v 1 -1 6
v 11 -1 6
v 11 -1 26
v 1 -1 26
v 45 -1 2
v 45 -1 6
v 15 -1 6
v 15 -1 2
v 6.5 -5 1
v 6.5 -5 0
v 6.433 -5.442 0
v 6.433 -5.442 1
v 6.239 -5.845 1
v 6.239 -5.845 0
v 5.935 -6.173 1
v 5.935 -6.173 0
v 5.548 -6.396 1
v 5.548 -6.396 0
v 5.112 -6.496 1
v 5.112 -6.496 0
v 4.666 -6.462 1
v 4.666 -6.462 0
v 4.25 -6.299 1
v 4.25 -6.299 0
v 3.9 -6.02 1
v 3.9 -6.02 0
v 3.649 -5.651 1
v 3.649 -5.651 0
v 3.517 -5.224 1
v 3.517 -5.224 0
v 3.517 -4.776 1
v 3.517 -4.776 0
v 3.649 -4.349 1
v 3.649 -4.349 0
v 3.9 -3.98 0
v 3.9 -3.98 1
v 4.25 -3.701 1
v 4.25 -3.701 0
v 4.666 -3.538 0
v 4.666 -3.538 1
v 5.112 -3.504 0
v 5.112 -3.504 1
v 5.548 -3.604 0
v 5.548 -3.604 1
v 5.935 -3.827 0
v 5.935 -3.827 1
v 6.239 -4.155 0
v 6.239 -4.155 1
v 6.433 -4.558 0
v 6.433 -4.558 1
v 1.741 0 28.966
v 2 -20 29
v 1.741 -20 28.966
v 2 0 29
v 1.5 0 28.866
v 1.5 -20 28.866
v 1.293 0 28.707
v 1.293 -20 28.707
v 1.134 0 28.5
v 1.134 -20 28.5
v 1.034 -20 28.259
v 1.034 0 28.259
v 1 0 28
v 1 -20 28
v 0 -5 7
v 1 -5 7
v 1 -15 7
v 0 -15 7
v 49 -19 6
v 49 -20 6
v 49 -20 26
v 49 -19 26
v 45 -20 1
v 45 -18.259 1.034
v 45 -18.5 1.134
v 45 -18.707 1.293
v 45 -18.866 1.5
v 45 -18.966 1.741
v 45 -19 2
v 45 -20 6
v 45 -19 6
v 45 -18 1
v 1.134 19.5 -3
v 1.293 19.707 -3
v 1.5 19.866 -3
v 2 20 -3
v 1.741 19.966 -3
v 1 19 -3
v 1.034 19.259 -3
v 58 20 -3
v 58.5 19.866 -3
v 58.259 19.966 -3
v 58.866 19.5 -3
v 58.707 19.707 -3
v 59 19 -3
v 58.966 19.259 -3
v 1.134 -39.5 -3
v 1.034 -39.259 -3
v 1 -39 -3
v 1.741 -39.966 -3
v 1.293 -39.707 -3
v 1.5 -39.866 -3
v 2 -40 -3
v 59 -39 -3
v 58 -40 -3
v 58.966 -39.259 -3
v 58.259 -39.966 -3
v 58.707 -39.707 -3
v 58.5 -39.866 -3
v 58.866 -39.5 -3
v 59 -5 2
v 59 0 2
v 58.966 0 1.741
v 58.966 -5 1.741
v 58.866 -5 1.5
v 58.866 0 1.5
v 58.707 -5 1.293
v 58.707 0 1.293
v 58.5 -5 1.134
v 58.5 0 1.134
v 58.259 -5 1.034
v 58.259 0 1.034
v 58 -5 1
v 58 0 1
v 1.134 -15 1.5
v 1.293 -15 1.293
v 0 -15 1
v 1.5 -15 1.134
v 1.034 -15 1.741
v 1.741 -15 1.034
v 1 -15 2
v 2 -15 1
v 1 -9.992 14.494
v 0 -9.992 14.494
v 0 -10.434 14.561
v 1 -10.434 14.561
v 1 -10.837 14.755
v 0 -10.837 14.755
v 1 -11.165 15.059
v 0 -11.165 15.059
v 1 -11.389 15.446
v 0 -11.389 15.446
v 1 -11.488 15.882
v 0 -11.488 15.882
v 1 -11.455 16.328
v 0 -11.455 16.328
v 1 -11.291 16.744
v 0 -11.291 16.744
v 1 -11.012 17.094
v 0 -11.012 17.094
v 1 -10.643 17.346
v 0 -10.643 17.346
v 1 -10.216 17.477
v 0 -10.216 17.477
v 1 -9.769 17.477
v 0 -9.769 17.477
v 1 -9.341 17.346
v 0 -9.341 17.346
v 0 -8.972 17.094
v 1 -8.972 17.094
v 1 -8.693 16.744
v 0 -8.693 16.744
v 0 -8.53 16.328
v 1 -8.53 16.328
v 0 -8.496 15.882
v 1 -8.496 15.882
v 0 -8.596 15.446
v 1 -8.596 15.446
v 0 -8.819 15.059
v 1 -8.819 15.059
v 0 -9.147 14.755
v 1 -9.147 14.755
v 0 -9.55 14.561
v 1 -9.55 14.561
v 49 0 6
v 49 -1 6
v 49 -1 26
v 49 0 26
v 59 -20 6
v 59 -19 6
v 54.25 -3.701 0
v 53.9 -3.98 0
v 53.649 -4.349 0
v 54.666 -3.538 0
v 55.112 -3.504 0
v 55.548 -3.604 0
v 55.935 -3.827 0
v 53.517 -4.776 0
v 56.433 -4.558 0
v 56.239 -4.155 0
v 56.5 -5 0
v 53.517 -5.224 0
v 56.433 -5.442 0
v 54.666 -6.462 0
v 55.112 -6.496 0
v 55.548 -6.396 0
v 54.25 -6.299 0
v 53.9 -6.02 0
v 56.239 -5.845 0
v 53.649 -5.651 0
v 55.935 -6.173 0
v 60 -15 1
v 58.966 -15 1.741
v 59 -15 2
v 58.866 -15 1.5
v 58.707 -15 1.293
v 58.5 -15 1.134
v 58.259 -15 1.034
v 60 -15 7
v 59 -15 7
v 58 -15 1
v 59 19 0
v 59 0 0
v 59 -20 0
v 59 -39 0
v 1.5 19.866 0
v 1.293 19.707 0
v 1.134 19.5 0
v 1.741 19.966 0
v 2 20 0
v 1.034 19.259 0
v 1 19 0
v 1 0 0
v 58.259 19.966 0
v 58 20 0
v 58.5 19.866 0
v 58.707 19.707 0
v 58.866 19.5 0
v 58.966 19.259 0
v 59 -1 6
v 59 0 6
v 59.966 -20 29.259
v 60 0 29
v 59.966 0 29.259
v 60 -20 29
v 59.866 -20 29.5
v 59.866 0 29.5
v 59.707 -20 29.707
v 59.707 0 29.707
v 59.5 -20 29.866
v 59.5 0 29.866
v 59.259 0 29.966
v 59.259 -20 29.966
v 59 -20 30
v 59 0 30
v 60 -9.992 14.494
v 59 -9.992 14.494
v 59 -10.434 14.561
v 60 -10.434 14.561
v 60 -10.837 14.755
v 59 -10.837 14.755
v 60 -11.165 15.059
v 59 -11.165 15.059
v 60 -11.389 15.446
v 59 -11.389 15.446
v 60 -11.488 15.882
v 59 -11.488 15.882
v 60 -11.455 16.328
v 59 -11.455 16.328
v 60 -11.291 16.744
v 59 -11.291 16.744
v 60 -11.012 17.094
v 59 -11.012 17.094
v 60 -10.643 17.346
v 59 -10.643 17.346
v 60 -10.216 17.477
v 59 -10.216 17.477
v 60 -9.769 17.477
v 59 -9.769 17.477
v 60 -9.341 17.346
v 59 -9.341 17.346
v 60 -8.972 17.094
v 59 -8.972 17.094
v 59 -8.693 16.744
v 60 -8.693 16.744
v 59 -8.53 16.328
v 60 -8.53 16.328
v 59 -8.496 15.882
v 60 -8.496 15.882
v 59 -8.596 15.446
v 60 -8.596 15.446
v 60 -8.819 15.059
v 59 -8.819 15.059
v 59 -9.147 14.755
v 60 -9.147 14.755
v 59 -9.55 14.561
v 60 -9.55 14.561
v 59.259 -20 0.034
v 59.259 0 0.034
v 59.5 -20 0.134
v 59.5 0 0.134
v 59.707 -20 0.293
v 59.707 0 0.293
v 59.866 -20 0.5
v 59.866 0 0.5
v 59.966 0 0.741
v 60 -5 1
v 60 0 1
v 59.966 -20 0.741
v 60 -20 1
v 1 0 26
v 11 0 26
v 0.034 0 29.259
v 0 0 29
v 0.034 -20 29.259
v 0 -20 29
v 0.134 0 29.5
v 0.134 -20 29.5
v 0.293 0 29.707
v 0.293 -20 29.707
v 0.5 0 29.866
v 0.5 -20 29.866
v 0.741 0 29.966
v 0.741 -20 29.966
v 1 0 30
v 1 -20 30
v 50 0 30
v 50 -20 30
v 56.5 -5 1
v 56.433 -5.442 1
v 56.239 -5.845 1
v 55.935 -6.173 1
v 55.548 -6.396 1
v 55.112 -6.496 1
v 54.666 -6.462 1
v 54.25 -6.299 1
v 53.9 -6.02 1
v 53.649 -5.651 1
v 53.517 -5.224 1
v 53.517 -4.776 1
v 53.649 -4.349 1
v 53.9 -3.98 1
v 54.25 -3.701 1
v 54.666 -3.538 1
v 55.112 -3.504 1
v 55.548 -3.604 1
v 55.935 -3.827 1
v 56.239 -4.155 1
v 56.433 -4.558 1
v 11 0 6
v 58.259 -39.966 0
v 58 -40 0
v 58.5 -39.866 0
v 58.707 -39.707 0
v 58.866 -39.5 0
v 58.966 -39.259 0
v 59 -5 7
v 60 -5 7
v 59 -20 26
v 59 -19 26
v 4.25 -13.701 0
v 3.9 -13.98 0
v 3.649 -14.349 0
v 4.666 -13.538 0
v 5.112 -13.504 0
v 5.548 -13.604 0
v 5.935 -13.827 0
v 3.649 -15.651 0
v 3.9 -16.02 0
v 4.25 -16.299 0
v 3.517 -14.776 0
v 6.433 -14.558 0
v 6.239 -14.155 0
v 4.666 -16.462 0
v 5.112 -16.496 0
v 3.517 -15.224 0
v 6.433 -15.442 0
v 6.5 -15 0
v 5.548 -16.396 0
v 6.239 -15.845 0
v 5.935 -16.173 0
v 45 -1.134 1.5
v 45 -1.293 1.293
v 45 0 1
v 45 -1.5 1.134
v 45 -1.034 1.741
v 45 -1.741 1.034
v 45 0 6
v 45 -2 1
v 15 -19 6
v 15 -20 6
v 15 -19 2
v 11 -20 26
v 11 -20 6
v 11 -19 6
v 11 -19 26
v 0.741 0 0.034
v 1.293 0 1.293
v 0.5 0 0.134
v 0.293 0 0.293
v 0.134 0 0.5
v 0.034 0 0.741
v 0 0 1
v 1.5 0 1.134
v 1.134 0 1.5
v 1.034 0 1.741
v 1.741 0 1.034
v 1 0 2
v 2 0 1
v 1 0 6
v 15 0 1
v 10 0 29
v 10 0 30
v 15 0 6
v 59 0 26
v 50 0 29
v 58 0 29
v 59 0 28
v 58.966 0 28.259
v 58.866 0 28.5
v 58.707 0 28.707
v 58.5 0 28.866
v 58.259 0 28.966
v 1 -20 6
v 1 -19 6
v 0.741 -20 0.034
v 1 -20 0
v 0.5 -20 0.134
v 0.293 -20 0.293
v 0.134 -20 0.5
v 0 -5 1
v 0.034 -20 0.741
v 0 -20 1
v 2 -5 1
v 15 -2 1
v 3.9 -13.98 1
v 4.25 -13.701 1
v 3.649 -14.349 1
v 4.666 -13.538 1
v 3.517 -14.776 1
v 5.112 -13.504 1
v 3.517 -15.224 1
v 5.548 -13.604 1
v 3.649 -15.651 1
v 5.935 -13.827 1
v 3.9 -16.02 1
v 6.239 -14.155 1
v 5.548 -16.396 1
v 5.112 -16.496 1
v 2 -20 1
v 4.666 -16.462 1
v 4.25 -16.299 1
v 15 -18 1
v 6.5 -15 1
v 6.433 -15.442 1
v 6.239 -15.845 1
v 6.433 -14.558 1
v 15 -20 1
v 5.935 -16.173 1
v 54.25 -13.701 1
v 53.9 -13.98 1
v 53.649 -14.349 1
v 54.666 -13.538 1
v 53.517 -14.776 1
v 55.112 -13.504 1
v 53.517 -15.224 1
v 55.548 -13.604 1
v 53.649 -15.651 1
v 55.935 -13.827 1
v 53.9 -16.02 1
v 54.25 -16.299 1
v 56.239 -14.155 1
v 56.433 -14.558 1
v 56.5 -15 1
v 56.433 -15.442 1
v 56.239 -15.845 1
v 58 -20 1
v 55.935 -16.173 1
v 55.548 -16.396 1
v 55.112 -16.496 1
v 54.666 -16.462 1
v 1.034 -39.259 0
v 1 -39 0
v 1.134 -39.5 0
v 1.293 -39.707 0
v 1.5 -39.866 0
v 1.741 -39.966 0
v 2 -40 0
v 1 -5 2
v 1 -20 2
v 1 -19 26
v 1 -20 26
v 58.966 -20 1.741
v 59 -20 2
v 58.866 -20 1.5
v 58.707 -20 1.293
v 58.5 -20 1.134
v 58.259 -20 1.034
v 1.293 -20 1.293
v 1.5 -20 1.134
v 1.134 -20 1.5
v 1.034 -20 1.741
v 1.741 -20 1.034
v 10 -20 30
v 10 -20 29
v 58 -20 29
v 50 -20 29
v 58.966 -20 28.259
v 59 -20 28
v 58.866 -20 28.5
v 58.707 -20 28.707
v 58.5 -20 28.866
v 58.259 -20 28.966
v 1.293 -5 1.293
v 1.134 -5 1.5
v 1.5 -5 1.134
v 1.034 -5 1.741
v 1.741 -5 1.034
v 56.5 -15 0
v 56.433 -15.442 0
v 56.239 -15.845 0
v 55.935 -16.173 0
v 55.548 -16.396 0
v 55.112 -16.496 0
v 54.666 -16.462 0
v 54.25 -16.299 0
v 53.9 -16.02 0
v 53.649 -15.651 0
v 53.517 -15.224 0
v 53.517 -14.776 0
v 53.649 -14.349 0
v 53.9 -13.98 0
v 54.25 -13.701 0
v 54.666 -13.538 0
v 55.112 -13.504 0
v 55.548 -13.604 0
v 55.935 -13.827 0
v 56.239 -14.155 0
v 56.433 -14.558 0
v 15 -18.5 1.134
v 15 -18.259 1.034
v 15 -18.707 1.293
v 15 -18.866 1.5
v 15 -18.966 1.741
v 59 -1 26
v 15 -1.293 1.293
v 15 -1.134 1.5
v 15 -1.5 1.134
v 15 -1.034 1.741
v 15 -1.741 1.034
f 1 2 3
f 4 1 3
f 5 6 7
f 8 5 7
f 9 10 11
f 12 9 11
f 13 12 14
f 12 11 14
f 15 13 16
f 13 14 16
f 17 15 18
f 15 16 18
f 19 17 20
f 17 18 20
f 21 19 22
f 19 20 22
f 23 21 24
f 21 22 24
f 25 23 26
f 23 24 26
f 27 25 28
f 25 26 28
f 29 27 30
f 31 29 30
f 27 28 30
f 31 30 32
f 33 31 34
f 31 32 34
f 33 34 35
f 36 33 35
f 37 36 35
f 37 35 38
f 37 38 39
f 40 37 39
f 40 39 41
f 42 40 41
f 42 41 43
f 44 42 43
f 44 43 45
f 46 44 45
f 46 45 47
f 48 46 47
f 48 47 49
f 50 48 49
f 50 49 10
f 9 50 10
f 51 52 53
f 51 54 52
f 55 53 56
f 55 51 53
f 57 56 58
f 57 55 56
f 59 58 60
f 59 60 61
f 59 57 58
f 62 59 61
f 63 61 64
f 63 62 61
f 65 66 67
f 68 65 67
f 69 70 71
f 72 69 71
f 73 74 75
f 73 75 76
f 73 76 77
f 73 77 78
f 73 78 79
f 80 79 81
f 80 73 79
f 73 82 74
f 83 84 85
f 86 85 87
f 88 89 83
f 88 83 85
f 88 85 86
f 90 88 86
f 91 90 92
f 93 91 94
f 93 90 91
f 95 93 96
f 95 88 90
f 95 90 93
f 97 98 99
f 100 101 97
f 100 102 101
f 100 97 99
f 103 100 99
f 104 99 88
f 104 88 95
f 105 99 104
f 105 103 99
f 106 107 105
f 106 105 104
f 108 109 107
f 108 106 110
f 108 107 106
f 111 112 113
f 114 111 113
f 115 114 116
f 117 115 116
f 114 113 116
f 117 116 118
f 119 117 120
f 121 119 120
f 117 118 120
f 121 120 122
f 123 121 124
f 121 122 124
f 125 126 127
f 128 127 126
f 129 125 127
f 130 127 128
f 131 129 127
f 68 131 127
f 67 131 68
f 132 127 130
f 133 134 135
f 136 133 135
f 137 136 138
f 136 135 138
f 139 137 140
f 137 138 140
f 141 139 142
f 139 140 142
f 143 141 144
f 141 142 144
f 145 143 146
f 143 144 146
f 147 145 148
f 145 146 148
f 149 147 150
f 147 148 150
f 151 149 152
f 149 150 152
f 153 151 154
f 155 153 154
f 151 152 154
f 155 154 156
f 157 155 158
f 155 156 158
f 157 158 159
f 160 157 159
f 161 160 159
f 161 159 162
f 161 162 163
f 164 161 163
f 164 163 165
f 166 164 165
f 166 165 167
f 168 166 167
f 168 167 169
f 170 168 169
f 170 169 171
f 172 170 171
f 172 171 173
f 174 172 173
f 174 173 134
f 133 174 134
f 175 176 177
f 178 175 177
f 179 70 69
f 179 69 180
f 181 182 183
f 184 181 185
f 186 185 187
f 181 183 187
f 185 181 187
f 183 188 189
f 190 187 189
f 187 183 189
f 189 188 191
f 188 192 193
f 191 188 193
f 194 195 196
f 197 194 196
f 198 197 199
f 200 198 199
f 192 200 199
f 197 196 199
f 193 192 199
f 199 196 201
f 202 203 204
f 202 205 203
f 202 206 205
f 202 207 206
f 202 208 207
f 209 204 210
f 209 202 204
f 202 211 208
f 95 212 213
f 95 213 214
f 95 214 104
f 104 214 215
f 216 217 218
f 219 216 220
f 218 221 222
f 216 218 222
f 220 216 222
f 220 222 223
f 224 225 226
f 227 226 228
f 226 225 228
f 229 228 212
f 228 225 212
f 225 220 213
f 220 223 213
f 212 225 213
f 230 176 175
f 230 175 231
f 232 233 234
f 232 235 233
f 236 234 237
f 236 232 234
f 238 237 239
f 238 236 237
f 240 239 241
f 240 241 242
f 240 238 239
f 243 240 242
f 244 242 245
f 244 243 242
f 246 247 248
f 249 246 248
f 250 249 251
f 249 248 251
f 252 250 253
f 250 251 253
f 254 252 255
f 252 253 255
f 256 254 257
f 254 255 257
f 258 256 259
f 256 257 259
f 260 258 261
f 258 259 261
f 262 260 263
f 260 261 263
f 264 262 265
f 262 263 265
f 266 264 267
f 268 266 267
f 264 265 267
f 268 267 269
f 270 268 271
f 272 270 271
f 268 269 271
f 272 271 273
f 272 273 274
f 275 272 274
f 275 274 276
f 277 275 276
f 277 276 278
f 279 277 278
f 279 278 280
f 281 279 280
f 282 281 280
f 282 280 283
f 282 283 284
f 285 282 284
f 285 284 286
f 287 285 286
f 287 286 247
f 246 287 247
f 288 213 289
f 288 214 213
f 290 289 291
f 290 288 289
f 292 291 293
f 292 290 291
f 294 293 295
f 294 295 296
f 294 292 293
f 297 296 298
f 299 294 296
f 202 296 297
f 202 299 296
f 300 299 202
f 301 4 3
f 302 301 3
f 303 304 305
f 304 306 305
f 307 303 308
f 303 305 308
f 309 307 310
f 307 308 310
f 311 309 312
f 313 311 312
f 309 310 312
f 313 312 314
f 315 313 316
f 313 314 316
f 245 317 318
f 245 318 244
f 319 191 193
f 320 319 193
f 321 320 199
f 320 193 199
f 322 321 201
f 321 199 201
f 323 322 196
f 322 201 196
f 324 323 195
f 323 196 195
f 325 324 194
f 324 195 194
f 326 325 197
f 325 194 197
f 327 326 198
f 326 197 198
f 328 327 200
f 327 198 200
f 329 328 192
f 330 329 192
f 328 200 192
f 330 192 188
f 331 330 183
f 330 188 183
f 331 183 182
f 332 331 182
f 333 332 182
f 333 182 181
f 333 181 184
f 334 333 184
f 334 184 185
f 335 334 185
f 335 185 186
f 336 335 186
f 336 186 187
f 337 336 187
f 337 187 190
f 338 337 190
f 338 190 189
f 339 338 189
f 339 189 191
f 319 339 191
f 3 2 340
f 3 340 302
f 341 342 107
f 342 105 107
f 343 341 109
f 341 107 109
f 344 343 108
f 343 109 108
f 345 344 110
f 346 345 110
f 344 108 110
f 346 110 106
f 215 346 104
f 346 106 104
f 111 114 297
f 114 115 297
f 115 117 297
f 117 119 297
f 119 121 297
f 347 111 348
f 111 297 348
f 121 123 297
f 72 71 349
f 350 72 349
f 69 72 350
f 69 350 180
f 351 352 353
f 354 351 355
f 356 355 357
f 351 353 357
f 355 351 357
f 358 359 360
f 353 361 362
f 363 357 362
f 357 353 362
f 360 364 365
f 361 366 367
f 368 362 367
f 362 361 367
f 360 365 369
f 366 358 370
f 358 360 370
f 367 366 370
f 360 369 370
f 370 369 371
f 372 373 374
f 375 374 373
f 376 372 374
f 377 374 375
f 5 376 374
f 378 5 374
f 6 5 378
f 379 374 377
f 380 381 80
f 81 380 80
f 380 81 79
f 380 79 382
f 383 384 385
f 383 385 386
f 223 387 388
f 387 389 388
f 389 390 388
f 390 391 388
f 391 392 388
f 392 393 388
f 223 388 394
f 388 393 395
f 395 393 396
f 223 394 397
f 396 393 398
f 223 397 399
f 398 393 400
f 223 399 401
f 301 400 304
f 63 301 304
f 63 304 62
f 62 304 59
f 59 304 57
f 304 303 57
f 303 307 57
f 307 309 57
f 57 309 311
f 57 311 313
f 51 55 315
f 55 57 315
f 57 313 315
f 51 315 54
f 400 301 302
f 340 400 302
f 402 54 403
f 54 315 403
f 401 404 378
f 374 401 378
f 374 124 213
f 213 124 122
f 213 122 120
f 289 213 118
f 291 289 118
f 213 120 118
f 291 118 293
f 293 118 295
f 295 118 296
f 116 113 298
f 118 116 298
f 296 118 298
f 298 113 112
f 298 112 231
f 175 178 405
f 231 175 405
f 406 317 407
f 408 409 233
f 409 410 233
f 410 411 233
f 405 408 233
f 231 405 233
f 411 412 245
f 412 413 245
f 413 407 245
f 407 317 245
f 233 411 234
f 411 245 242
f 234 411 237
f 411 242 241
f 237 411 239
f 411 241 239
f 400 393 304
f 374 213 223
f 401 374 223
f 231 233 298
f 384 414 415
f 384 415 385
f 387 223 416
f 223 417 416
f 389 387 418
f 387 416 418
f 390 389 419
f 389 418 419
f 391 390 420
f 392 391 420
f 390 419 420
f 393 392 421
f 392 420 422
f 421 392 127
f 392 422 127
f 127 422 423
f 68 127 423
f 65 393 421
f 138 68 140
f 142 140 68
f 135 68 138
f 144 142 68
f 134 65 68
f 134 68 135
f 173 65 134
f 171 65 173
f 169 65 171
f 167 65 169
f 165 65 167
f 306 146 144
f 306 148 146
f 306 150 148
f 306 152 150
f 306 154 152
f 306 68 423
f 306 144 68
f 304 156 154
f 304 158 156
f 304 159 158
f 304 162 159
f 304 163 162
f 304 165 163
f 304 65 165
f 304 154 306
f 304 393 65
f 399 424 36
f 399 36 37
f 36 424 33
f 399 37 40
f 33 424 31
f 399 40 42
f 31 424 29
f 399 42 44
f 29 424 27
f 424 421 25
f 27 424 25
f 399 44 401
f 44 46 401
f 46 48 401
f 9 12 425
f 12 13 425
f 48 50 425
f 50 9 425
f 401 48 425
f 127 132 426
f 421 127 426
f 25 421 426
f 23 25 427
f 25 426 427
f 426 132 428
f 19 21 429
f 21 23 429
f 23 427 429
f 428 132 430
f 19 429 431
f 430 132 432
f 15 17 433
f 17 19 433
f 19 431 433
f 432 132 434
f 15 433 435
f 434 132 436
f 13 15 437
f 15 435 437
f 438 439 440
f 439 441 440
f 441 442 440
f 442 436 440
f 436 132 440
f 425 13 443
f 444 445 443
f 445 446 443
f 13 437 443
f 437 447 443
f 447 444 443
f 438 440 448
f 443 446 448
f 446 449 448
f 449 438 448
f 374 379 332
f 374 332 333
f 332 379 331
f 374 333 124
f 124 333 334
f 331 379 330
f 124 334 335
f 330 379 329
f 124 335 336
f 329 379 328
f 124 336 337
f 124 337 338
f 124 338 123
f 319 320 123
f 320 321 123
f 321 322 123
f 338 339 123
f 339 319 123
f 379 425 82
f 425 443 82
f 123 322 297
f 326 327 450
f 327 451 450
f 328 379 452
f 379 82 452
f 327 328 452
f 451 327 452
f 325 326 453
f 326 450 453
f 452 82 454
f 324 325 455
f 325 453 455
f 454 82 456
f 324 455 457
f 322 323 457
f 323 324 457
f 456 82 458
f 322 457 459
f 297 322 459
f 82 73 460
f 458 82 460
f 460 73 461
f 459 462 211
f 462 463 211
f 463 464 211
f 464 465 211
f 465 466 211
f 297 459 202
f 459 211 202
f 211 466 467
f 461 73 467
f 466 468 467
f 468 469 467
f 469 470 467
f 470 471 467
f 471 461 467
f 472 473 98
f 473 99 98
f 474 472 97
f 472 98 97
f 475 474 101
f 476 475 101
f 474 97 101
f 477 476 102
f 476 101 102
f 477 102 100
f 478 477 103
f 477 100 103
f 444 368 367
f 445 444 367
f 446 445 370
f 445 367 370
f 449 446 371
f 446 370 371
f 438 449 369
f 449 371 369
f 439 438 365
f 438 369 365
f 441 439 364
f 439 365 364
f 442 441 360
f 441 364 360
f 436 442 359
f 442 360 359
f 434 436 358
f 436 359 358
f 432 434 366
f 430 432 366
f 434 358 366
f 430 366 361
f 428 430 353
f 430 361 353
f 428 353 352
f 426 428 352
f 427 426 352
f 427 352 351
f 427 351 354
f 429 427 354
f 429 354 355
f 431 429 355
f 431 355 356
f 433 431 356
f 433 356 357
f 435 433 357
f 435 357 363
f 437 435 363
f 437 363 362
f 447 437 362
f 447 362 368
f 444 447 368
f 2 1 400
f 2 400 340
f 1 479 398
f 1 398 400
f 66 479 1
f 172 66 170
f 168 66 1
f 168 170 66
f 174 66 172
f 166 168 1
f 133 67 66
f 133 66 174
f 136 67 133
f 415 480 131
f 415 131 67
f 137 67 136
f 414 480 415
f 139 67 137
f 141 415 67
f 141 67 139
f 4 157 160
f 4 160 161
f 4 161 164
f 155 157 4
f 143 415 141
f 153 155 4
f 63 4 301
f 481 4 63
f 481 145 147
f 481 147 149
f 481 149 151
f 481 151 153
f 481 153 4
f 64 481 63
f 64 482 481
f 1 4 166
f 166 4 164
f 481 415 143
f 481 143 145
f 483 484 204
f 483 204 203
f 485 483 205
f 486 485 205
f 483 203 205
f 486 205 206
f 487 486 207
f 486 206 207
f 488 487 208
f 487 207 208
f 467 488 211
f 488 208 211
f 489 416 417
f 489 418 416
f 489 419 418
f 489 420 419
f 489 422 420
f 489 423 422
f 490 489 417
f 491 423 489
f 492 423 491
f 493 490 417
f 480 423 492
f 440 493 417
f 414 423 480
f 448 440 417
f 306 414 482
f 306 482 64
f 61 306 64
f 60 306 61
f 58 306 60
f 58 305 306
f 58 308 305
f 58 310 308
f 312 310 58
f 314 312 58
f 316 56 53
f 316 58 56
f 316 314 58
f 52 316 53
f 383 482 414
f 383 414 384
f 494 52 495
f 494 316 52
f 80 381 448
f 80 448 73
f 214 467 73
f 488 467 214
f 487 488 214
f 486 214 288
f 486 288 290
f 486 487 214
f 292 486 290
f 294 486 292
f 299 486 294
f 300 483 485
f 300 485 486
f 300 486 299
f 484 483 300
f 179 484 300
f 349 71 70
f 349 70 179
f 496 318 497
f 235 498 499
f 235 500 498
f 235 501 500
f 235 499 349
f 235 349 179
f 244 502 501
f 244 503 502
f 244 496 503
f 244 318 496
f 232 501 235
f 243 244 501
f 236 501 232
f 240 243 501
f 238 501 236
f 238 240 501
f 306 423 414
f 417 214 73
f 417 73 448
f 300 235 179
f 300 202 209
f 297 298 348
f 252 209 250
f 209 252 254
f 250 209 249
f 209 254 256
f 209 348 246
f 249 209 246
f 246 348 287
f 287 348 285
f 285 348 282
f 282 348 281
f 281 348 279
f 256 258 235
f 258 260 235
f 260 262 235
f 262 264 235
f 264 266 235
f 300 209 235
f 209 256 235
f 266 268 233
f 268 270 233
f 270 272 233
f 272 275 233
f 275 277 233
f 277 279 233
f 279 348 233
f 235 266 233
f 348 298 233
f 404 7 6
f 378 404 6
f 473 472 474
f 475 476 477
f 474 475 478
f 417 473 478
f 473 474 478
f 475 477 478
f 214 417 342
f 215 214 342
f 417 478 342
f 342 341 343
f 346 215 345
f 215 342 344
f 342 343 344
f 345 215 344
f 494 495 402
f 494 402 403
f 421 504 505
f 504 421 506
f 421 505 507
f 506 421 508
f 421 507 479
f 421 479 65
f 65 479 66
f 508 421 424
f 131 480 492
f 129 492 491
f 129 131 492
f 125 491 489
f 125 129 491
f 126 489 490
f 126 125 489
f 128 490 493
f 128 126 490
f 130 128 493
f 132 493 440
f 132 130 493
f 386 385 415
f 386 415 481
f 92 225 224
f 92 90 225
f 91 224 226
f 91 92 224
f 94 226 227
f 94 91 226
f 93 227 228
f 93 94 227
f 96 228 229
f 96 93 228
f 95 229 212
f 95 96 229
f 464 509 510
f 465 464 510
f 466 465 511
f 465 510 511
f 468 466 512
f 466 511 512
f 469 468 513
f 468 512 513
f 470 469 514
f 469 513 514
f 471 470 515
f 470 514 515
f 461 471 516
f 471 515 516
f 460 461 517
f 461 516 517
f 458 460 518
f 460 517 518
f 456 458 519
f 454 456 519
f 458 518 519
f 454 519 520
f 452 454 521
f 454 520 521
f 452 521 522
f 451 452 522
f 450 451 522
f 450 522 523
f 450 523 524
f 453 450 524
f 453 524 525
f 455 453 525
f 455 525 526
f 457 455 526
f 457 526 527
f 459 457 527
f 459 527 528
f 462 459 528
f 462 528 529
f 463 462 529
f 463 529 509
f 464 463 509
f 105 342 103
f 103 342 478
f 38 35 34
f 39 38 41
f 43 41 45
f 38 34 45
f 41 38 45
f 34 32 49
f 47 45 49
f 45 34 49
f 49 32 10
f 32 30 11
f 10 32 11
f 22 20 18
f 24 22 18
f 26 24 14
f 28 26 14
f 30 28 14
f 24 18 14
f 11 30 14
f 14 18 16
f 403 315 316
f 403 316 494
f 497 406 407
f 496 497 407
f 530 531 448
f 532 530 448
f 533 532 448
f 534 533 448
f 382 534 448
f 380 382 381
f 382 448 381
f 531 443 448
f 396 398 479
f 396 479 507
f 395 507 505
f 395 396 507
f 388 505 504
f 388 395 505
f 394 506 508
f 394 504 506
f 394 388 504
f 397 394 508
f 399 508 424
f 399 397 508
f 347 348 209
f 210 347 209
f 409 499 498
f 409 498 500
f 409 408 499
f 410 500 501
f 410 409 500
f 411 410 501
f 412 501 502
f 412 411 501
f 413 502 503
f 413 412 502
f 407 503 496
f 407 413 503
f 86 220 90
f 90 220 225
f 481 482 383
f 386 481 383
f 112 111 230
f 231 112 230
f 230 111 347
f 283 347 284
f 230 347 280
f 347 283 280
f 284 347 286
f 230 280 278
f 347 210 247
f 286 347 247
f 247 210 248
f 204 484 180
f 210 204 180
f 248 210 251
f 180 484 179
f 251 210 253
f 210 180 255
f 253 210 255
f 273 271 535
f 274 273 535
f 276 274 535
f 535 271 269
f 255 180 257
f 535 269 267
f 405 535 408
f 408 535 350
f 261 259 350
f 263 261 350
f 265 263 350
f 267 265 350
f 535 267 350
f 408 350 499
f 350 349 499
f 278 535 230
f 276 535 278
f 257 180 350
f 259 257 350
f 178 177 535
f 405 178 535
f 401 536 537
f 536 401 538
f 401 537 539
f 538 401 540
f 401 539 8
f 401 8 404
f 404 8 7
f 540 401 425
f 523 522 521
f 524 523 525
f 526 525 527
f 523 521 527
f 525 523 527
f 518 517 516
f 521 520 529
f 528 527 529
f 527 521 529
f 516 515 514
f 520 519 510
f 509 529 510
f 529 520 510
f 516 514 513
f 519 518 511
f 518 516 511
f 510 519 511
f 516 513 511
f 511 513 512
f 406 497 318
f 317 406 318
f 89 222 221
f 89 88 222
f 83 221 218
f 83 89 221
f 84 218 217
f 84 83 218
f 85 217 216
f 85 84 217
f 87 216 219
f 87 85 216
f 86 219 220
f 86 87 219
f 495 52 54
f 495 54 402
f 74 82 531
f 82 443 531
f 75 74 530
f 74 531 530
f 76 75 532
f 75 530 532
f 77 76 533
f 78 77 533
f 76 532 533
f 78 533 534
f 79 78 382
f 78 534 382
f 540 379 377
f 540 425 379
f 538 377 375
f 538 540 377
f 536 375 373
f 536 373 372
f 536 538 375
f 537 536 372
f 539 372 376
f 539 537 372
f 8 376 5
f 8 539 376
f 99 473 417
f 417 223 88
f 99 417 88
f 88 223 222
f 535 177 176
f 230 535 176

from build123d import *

# Parameters (mm, degrees)
SKETCH_W        = 60
SKETCH_H        = 30
PAD_DEPTH       = 20
SKETCH001_W     = 14
SKETCH001_H     = 5
POCKET_DEPTH    = 20.001
SKETCH002_W     = 14
SKETCH002_H     = 5
POCKET001_DEPTH = 20.001
SKETCH003_W     = 38
SKETCH003_H     = 20
POCKET002_DEPTH = 20.001
SKETCH005_W     = 38
SKETCH005_H     = 5
POCKET003_DEPTH = 20.001
SKETCH006_W     = 9
SKETCH006_H     = 3
POCKET004_DEPTH = 20.001
SKETCH007_W     = 1
SKETCH007_H     = 4
POCKET005_DEPTH = 20.001
SKETCH008_W     = 30
SKETCH008_H     = 18
POCKET006_DEPTH = 5
FILLET_R        = 1
FILLET001_R     = 1
FILLET002_R     = 1
FILLET003_R     = 1
FILLET004_R     = 1
FILLET005_R     = 1
FILLET006_R     = 1
FILLET007_R     = 1
SKETCH011_W     = 20
SKETCH011_H     = 18
POCKET007_DEPTH = 10
SKETCH012_W     = 20
SKETCH012_H     = 18
POCKET008_DEPTH = 10
FILLET008_R     = 1
FILLET009_R     = 1
SKETCH014_W     = 6
SKETCH014_H     = 10
POCKET009_DEPTH = 60.001
SKETCH015_R     = 1.5
POCKET010_DEPTH = 5
SKETCH016_R     = 1.5
POCKET011_DEPTH = 60.001
PAD001_DEPTH    = 3
FILLET010_R     = 1
FILLET011_R     = 1
FILLET012_R     = 1
FILLET013_R     = 1


with BuildPart() as part:
    # Sketch → Pad (new body)
    with BuildSketch(Plane.XZ):
        with Locations((30, 15)):
            Rectangle(SKETCH_W, SKETCH_H)
    extrude(amount=PAD_DEPTH)

    # Sketch001 (on Face6 of Pad) → Pocket (cut, through all)
    with BuildSketch(Plane.XZ.offset(20)):
        with Locations((8, 3.5)):
            Rectangle(SKETCH001_W, SKETCH001_H)
    extrude(amount=-POCKET_DEPTH, mode=Mode.SUBTRACT)

    # Sketch002 (on Face5 of Pocket) → Pocket001 (cut, through all)
    with BuildSketch(Plane.XZ.offset(20)):
        with Locations((52, 3.5)):
            Rectangle(SKETCH002_W, SKETCH002_H)
    extrude(amount=-POCKET001_DEPTH, mode=Mode.SUBTRACT)

    # Sketch003 (on Face5 of Pocket001) → Pocket002 (cut, through all)
    with BuildSketch(Plane.XZ.offset(20)):
        with Locations((30, 16)):
            Rectangle(SKETCH003_W, SKETCH003_H)
    extrude(amount=-POCKET002_DEPTH, mode=Mode.SUBTRACT)

    # Sketch005 (on Face5 of Pocket002) → Pocket003 (cut, through all)
    with BuildSketch(Plane.XZ.offset(20)):
        with Locations((30, 28.5)):
            Rectangle(SKETCH005_W, SKETCH005_H)
    extrude(amount=-POCKET003_DEPTH, mode=Mode.SUBTRACT)

    # Sketch006 (on Face5 of Pocket003) → Pocket004 (cut, through all)
    with BuildSketch(Plane.XZ.offset(20)):
        with Locations((5.5, 27.5)):
            Rectangle(SKETCH006_W, SKETCH006_H)
        with Locations((54.5, 27.5)):
            Rectangle(SKETCH006_W, SKETCH006_H)
    extrude(amount=-POCKET004_DEPTH, mode=Mode.SUBTRACT)

    # Sketch007 (on Face5 of Pocket004) → Pocket005 (cut, through all)
    with BuildSketch(Plane.XZ.offset(20)):
        with Locations((10.5, 28)):
            Rectangle(SKETCH007_W, SKETCH007_H)
        with Locations((49.5, 28)):
            Rectangle(SKETCH007_W, SKETCH007_H)
    extrude(amount=-POCKET005_DEPTH, mode=Mode.SUBTRACT)

    # Sketch008 (on Face18 of Pocket005) → Pocket006 (cut)
    with BuildSketch(Plane(origin=(0, 0, 6), x_dir=(-1, 0, 0), z_dir=(0, 0, 1))):
        with Locations((-30, 10)):
            Rectangle(SKETCH008_W, SKETCH008_H)
    extrude(amount=-POCKET006_DEPTH, mode=Mode.SUBTRACT)

    # Fillet
    fillet_edges = [part.edges().sort_by_distance(p)[0] for p in [
        (60, -10, 0),
    ]]
    fillet(fillet_edges, radius=FILLET_R)

    # Fillet001
    fillet001_edges = [part.edges().sort_by_distance(p)[0] for p in [
        (0, -10, 0),
    ]]
    fillet(fillet001_edges, radius=FILLET001_R)

    # Fillet002
    fillet002_edges = [part.edges().sort_by_distance(p)[0] for p in [
        (0, -10, 30),
    ]]
    fillet(fillet002_edges, radius=FILLET002_R)

    # Fillet003
    fillet003_edges = [part.edges().sort_by_distance(p)[0] for p in [
        (60, -10, 30),
    ]]
    fillet(fillet003_edges, radius=FILLET003_R)

    # Fillet004
    fillet004_edges = [part.edges().sort_by_distance(p)[0] for p in [
        (1, -10, 29),
    ]]
    fillet(fillet004_edges, radius=FILLET004_R)

    # Fillet005
    fillet005_edges = [part.edges().sort_by_distance(p)[0] for p in [
        (1, -10, 1),
    ]]
    fillet(fillet005_edges, radius=FILLET005_R)

    # Fillet006
    fillet006_edges = [part.edges().sort_by_distance(p)[0] for p in [
        (59, -10, 29),
    ]]
    fillet(fillet006_edges, radius=FILLET006_R)

    # Fillet007
    fillet007_edges = [part.edges().sort_by_distance(p)[0] for p in [
        (59, -10, 1),
    ]]
    fillet(fillet007_edges, radius=FILLET007_R)

    # Sketch011 (on Face6 of Fillet007) → Pocket007 (cut)
    with BuildSketch(Plane(origin=(49, 0, 0), x_dir=(0, 0, -1), z_dir=(-1, 0, 0))):
        with Locations((-16, 10)):
            Rectangle(SKETCH011_W, SKETCH011_H)
    extrude(amount=-POCKET007_DEPTH, mode=Mode.SUBTRACT)

    # Sketch012 (on Face21 of Pocket007) → Pocket008 (cut)
    with BuildSketch(Plane(origin=(11, 0, 0), x_dir=(0, 0, 1), z_dir=(1, 0, 0))):
        with Locations((16, 10)):
            Rectangle(SKETCH012_W, SKETCH012_H)
    extrude(amount=-POCKET008_DEPTH, mode=Mode.SUBTRACT)

    # Fillet008
    fillet008_edges = [part.edges().sort_by_distance(p)[0] for p in [
        (30, -19, 1),
    ]]
    fillet(fillet008_edges, radius=FILLET008_R)

    # Fillet009
    fillet009_edges = [part.edges().sort_by_distance(p)[0] for p in [
        (30, -1, 1),
    ]]
    fillet(fillet009_edges, radius=FILLET009_R)

    # Sketch014 (on Face33 of Fillet009) → Pocket009 (cut, through all)
    with BuildSketch(Plane(origin=(60, 0, 0), x_dir=(0, 0, 1), z_dir=(1, 0, 0))):
        with Locations((4, 10)):
            Rectangle(SKETCH014_W, SKETCH014_H)
    extrude(amount=-POCKET009_DEPTH, mode=Mode.SUBTRACT)

    # Sketch015 (on Face32 of Pocket009) → Pocket010 (cut)
    with BuildSketch(Plane(origin=(0, 0, 0), x_dir=(1, 0, 0), z_dir=(0, 0, -1))):
        with Locations((55, 5)):
            Circle(SKETCH015_R)
        with Locations((55, 15)):
            Circle(SKETCH015_R)
        with Locations((5, 5)):
            Circle(SKETCH015_R)
        with Locations((5, 15)):
            Circle(SKETCH015_R)
    extrude(amount=-POCKET010_DEPTH, mode=Mode.SUBTRACT)

    # Sketch016 (on Face30 of Pocket010) → Pocket011 (cut, through all)
    with BuildSketch(Plane(origin=(0, 0, 0), x_dir=(0, 0, -1), z_dir=(-1, 0, 0))):
        with Locations((-15.994056, 9.992209)):
            Circle(SKETCH016_R)
    extrude(amount=-POCKET011_DEPTH, mode=Mode.SUBTRACT)

    # Sketch017 (on Face32 of Pocket011) → Pad001 (join)
    with BuildSketch(Plane(origin=(0, 0, 0), x_dir=(1, 0, 0), z_dir=(0, 0, -1))):
        Polygon((59, 20), (59, 40), (1, 40), (1, 20), (1, 0), (1, -20), (59, -20), (59, 0), align=None)
    extrude(amount=PAD001_DEPTH)

    # Fillet010
    fillet010_edges = [part.edges().sort_by_distance(p)[0] for p in [
        (59, -40, -1.5),
    ]]
    fillet(fillet010_edges, radius=FILLET010_R)

    # Fillet011
    fillet011_edges = [part.edges().sort_by_distance(p)[0] for p in [
        (1, 20, -1.5),
    ]]
    fillet(fillet011_edges, radius=FILLET011_R)

    # Fillet012
    fillet012_edges = [part.edges().sort_by_distance(p)[0] for p in [
        (59, 20, -1.5),
    ]]
    fillet(fillet012_edges, radius=FILLET012_R)

    # Fillet013
    fillet013_edges = [part.edges().sort_by_distance(p)[0] for p in [
        (1, -40, -1.5),
    ]]
    fillet(fillet013_edges, radius=FILLET013_R)


solid = part.part
